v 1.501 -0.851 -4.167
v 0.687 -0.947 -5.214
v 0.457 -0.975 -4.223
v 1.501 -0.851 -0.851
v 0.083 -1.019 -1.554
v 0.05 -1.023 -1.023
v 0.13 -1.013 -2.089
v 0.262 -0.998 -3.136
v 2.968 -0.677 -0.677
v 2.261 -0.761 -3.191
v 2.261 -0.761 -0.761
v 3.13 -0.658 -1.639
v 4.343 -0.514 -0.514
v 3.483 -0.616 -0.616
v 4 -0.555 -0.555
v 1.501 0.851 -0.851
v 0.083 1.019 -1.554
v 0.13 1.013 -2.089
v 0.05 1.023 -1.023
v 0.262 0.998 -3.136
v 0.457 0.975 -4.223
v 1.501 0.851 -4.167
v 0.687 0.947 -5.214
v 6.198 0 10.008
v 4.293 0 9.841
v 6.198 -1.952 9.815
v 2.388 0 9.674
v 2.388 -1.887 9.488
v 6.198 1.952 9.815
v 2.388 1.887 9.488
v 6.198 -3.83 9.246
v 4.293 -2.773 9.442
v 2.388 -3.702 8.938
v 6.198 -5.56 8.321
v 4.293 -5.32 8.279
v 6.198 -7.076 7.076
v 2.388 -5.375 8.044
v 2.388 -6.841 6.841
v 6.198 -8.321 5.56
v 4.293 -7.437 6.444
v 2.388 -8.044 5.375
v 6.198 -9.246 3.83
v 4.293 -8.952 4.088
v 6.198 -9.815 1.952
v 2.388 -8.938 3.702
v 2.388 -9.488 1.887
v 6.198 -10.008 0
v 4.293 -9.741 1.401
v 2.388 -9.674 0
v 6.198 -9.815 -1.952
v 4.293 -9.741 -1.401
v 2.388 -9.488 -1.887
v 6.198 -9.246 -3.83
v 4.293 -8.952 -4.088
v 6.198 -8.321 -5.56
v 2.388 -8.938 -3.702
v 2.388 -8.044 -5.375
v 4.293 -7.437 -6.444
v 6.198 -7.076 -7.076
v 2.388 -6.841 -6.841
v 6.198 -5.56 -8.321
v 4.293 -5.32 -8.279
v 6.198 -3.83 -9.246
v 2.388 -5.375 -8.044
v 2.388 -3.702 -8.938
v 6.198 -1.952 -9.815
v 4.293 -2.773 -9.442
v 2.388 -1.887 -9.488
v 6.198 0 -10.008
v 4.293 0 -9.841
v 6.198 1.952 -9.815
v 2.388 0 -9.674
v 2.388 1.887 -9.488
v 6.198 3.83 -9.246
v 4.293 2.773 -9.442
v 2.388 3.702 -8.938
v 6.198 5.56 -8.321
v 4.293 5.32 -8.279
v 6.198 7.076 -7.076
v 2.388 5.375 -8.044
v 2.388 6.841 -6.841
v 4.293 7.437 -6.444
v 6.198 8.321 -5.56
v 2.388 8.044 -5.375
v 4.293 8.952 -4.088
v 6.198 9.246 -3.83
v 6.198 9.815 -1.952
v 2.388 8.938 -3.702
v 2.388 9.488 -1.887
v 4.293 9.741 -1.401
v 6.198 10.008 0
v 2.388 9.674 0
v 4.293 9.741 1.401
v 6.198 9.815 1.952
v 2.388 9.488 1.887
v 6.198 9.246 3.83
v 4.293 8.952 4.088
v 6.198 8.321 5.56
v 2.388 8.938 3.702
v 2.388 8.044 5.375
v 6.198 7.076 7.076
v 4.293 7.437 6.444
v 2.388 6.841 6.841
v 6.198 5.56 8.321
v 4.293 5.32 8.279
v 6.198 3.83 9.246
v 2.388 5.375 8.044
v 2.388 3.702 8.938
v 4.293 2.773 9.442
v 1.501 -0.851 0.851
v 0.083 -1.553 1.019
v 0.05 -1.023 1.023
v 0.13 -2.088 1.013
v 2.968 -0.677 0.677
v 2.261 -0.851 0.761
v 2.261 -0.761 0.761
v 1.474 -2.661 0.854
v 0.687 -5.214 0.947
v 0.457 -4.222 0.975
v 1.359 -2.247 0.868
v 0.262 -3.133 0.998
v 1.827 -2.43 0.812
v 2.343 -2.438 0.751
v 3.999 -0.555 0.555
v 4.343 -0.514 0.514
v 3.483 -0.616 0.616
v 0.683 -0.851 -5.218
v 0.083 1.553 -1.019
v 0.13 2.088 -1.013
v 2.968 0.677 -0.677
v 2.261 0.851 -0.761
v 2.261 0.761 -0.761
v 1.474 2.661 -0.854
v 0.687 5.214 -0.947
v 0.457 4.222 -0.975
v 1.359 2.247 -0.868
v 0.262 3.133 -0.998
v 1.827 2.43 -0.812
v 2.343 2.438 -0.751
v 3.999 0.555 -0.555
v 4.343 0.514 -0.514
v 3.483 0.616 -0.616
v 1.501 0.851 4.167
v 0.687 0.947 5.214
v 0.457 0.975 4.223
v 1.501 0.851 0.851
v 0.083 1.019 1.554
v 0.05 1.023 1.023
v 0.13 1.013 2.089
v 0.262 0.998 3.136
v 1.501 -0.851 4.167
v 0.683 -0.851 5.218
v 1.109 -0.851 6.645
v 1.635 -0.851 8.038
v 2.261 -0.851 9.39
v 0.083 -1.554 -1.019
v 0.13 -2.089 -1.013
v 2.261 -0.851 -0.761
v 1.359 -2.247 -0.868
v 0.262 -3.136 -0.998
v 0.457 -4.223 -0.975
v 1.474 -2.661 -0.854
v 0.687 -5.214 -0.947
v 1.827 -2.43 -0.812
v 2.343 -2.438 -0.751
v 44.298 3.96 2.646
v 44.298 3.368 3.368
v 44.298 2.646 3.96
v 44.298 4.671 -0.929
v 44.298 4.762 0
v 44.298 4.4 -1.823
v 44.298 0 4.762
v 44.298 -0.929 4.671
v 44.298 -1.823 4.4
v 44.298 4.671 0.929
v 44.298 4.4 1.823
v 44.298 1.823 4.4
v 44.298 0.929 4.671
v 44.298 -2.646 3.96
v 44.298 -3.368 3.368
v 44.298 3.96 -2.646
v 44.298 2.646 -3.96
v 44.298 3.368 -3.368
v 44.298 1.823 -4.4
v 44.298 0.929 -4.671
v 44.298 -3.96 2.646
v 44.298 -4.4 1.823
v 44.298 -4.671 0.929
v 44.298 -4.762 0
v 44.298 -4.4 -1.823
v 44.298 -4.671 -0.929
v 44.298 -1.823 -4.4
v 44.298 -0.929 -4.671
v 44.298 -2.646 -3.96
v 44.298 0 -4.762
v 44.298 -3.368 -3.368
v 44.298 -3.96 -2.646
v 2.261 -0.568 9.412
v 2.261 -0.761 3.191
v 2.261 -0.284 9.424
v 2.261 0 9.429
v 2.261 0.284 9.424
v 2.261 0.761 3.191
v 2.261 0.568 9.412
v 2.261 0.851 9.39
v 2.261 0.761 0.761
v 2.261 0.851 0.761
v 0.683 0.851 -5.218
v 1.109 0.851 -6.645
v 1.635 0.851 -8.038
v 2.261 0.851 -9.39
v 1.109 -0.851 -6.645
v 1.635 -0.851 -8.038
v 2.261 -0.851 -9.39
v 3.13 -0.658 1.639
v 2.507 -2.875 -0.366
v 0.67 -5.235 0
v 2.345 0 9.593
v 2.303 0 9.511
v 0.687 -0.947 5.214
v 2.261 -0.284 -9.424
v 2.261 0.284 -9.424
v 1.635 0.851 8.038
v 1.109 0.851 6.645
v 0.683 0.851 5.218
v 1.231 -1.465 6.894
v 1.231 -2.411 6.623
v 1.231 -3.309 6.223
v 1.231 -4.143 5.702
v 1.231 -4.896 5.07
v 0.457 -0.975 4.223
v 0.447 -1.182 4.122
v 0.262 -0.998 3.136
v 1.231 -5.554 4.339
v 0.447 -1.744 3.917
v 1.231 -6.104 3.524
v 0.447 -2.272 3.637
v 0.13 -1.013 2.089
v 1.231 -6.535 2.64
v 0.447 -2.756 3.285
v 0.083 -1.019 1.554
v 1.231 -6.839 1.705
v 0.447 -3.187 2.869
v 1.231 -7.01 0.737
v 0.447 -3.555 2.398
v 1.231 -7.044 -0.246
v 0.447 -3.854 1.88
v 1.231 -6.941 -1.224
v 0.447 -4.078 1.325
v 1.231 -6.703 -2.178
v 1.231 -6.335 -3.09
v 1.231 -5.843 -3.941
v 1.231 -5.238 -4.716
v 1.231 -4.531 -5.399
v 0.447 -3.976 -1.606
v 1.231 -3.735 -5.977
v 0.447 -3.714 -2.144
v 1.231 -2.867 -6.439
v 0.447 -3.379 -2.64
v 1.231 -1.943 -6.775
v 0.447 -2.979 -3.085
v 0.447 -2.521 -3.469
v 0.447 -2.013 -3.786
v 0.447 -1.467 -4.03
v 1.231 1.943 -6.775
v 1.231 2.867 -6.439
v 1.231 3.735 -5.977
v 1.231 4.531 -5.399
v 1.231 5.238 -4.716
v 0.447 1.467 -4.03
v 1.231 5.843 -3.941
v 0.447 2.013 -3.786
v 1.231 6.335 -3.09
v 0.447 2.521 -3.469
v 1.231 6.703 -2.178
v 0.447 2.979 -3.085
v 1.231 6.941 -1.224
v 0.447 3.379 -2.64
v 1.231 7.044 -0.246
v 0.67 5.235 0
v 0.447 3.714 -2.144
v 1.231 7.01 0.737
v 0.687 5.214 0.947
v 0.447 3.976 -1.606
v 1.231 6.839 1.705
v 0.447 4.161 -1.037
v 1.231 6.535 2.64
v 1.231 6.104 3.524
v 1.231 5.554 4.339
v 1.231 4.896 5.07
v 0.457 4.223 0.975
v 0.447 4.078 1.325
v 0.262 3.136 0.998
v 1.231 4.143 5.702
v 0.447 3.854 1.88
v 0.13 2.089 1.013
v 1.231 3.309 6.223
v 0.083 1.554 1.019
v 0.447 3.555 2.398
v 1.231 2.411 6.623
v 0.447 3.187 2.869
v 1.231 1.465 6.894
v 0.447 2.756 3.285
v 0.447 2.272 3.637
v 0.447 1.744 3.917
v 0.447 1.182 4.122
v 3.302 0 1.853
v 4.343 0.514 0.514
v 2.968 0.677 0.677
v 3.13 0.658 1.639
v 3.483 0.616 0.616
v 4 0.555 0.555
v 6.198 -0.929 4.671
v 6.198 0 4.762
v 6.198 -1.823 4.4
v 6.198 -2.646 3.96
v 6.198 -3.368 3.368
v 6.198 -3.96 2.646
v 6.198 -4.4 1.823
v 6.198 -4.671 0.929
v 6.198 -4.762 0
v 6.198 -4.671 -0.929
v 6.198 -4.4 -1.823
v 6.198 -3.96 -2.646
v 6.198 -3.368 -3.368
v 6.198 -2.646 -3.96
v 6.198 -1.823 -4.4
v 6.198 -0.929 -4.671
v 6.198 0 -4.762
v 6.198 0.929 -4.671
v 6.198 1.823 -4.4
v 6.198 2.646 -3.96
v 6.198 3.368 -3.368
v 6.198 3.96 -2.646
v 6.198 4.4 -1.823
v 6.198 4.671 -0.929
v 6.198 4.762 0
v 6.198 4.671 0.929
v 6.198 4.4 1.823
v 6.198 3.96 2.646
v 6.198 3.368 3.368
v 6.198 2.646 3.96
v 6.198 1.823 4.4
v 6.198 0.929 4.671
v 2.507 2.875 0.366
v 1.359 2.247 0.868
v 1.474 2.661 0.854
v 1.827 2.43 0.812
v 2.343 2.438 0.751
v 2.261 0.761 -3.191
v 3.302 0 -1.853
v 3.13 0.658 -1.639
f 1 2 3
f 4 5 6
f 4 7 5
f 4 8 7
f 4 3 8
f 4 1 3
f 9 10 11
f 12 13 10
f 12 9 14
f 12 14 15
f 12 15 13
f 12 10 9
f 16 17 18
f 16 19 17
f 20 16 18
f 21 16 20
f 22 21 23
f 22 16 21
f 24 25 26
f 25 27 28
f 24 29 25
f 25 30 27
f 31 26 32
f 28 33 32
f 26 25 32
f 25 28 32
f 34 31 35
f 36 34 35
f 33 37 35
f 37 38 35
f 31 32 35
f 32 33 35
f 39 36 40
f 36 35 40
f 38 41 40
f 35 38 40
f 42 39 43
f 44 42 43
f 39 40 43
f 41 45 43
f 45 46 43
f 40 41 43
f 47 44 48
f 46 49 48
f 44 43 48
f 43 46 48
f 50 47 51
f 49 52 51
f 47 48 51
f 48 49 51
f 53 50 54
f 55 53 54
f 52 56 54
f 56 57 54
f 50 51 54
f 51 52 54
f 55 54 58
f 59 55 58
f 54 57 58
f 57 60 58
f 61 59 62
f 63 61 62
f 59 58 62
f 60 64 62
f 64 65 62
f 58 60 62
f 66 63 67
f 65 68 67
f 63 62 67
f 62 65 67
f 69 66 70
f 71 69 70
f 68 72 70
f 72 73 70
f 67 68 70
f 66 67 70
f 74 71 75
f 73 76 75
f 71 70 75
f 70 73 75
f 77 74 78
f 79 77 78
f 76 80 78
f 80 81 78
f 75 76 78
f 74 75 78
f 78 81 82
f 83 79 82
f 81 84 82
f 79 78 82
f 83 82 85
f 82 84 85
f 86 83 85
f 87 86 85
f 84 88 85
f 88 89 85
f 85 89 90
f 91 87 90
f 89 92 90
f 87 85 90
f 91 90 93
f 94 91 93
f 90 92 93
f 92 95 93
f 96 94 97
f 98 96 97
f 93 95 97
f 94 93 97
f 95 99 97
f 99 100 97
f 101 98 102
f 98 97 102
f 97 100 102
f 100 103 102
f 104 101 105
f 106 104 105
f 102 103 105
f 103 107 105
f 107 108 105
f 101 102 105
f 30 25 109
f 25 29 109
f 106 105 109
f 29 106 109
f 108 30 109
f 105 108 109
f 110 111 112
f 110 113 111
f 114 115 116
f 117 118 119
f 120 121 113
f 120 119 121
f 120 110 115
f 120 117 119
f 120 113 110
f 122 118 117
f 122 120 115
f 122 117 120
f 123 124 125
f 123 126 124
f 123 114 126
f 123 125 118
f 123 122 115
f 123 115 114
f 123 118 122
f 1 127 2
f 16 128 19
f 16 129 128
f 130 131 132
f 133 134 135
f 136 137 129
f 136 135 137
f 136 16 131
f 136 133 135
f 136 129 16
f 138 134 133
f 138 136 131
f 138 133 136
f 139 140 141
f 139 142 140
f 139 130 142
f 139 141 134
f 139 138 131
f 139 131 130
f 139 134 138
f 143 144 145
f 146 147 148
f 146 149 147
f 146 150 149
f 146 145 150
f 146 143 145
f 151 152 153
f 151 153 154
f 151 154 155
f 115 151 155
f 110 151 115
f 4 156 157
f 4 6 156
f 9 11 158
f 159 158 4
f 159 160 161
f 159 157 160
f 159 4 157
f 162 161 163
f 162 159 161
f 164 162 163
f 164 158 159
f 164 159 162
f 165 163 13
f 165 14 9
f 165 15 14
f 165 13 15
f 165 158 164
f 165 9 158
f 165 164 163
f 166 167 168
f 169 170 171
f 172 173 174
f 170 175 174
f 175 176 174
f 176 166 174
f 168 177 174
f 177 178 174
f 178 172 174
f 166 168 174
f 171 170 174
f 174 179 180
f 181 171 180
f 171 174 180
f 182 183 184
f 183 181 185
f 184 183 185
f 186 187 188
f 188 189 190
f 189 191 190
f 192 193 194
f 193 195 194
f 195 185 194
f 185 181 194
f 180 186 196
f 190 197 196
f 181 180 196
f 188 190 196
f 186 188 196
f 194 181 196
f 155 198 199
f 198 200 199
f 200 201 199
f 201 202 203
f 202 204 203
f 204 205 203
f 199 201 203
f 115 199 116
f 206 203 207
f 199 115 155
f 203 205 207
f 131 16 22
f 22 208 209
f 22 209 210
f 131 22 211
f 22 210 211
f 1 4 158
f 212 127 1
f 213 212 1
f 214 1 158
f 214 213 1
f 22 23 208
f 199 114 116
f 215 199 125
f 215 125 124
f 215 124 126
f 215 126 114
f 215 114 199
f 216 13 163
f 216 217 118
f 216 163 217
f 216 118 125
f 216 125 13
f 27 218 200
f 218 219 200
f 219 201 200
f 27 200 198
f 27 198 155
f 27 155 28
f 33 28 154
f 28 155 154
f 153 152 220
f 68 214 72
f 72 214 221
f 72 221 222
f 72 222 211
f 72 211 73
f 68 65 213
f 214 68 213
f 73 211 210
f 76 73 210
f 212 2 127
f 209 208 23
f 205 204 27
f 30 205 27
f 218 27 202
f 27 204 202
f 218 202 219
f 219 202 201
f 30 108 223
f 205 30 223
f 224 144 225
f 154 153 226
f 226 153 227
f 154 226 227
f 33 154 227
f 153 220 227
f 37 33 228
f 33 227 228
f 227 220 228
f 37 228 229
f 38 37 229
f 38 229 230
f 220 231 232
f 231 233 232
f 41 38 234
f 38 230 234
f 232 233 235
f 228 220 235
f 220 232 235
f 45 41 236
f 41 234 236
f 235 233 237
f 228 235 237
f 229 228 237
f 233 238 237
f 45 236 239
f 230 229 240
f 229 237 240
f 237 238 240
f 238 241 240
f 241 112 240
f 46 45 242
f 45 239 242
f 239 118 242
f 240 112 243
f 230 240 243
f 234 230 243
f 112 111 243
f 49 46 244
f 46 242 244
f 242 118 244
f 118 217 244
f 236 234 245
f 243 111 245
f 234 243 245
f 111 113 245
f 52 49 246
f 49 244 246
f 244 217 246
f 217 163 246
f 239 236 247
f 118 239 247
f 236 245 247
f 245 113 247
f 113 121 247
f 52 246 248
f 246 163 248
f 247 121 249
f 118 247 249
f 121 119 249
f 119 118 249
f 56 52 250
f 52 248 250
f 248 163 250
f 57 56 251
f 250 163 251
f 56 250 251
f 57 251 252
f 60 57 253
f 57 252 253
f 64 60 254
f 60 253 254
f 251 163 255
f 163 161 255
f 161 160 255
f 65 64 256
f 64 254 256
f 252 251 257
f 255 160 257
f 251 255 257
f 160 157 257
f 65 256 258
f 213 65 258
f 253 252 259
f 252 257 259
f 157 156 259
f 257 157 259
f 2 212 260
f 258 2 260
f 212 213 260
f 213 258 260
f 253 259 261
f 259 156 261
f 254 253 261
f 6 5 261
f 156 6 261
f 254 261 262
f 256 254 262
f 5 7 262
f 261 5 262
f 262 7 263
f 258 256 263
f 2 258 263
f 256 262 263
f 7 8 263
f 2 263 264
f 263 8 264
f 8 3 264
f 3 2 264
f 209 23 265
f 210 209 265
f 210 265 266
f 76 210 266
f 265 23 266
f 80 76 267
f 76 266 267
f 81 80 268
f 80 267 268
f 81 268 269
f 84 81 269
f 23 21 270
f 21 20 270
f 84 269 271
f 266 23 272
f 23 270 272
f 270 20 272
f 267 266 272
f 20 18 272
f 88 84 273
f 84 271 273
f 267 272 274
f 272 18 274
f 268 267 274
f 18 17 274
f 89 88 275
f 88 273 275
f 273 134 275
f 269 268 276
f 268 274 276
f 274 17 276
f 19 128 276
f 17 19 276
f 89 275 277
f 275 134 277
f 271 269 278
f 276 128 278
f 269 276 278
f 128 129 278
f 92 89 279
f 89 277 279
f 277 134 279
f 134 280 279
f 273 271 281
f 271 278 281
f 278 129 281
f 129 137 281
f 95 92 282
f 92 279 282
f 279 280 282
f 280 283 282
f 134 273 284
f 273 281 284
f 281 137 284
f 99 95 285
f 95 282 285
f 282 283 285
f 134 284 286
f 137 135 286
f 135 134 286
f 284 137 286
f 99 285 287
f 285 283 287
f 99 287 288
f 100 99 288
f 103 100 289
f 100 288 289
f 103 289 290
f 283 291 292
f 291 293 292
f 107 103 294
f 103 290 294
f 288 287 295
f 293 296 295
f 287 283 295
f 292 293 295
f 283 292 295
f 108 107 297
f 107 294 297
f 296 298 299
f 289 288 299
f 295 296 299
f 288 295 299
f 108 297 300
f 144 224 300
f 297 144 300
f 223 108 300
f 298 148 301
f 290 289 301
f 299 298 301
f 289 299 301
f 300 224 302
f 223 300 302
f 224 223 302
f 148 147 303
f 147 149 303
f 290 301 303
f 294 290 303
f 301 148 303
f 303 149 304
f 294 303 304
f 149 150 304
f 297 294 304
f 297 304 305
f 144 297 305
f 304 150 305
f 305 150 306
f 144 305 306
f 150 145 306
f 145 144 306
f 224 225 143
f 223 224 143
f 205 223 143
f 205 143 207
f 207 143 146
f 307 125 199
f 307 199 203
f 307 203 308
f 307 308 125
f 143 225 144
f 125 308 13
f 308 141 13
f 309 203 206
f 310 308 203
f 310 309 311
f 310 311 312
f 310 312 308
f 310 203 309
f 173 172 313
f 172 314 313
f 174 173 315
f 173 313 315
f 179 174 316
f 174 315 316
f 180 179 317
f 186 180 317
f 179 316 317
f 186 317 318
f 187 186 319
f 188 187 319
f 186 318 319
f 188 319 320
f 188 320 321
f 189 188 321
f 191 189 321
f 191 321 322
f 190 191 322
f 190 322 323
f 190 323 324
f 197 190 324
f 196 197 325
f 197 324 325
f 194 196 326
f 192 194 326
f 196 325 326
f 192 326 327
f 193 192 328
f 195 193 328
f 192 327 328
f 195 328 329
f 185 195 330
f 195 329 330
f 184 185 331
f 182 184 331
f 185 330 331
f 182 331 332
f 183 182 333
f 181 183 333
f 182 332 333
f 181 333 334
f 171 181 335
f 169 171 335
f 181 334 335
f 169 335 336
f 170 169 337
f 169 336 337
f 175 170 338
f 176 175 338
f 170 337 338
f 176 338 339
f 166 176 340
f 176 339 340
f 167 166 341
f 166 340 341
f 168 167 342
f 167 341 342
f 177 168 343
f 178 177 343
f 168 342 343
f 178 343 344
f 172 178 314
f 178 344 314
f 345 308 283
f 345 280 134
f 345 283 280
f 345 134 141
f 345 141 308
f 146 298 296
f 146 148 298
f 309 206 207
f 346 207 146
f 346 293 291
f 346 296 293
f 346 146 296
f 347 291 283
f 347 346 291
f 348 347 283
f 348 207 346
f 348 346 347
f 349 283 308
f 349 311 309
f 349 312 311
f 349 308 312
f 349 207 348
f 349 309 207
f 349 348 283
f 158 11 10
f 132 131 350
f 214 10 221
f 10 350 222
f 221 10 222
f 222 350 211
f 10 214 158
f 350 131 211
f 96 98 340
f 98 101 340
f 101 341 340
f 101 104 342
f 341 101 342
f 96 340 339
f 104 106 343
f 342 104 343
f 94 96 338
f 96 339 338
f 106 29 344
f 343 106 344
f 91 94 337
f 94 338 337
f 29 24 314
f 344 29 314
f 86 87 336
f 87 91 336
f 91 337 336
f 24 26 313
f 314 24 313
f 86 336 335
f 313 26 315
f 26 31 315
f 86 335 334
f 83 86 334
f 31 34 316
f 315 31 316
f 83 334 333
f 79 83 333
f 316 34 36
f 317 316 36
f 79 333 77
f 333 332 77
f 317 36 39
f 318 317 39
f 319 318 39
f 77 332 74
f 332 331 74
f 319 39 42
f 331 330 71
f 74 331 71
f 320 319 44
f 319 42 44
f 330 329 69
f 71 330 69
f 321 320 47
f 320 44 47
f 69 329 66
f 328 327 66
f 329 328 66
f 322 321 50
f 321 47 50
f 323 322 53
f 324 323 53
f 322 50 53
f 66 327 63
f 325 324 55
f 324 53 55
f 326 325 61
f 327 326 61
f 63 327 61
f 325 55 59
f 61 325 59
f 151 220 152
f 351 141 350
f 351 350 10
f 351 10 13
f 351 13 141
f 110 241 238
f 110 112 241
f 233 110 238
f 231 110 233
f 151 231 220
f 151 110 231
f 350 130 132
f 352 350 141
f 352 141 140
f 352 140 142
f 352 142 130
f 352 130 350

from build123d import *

# Parameters (mm, degrees)
SKETCH2_W         = 20.0152
SKETCH2_H         = 1.7018
SLOT_DEPTH        = 2.2606
CIRPATTERN1_COUNT = 2
CIRPATTERN1_ANGLE = 90


with BuildPart() as part:
    # BodySke → Base-Revolve (revolve)
    with BuildSketch(Plane.XY, mode=Mode.PRIVATE) as base_revolve_sk:
        with BuildLine():
            Line((6.1976, 4.7625), (6.1976, 10.0076))
            Line((6.1976, 10.0076), (2.3876, 9.674268192))
            ThreePointArc((2.3876, 9.674268192), (0.605722555, 4.982271039), (0, 0))
            Line((0, 0), (44.2976, 0))
            Line((44.2976, 0), (44.2976, 4.7625))
            Line((44.2976, 4.7625), (6.1976, 4.7625))
        make_face()
    revolve(base_revolve_sk.sketch.rotate(Axis((-25.4, 0, 0), (1, 0, 0)), 90), axis=Axis((-25.4, 0, 0), (1, 0, 0)))

    # Sketch2 → Slot (cut)
    with BuildSketch(Plane(origin=(0, 0, 0), x_dir=(0, 0, -1), z_dir=(1, 0, 0))):
        Rectangle(SKETCH2_W, SKETCH2_H)
    extrude(amount=SLOT_DEPTH, mode=Mode.SUBTRACT)

    # Sketch3 → Cross section 0
    with BuildSketch(Plane(origin=(0, 0, 0), x_dir=(0, 0, -1), z_dir=(1, 0, 0))):
        with BuildLine():
            Line((-1.0287, 6.096), (1.0287, 6.096))
            Line((1.0287, 6.096), (1.0287, -6.096))
            Line((1.0287, -6.096), (-1.0287, -6.096))
            Line((-1.0287, -6.096), (-1.0287, 6.096))
        make_face()
    # Sketch4 → Cross section 1
    with BuildSketch(Plane(origin=(4.3434, 0, 0), x_dir=(0, 0, -1), z_dir=(1, 0, 0))):
        with BuildLine():
            Line((-0.51435, 0.51435), (0.51435, 0.51435))
            Line((0.51435, 0.51435), (0.51435, -0.51435))
            Line((0.51435, -0.51435), (-0.51435, -0.51435))
            Line((-0.51435, -0.51435), (-0.51435, 0.51435))
        make_face()
    cross = loft(mode=Mode.SUBTRACT)

    # CirPattern1: Cross ×2 about axis
    cirpattern1_axis = Axis((0, 0, 0), (1, 0, 0))
    for i in range(1, CIRPATTERN1_COUNT):
        add(cross.rotate(cirpattern1_axis, i * CIRPATTERN1_ANGLE / (CIRPATTERN1_COUNT - 1)), mode=Mode.SUBTRACT)


solid = part.part
